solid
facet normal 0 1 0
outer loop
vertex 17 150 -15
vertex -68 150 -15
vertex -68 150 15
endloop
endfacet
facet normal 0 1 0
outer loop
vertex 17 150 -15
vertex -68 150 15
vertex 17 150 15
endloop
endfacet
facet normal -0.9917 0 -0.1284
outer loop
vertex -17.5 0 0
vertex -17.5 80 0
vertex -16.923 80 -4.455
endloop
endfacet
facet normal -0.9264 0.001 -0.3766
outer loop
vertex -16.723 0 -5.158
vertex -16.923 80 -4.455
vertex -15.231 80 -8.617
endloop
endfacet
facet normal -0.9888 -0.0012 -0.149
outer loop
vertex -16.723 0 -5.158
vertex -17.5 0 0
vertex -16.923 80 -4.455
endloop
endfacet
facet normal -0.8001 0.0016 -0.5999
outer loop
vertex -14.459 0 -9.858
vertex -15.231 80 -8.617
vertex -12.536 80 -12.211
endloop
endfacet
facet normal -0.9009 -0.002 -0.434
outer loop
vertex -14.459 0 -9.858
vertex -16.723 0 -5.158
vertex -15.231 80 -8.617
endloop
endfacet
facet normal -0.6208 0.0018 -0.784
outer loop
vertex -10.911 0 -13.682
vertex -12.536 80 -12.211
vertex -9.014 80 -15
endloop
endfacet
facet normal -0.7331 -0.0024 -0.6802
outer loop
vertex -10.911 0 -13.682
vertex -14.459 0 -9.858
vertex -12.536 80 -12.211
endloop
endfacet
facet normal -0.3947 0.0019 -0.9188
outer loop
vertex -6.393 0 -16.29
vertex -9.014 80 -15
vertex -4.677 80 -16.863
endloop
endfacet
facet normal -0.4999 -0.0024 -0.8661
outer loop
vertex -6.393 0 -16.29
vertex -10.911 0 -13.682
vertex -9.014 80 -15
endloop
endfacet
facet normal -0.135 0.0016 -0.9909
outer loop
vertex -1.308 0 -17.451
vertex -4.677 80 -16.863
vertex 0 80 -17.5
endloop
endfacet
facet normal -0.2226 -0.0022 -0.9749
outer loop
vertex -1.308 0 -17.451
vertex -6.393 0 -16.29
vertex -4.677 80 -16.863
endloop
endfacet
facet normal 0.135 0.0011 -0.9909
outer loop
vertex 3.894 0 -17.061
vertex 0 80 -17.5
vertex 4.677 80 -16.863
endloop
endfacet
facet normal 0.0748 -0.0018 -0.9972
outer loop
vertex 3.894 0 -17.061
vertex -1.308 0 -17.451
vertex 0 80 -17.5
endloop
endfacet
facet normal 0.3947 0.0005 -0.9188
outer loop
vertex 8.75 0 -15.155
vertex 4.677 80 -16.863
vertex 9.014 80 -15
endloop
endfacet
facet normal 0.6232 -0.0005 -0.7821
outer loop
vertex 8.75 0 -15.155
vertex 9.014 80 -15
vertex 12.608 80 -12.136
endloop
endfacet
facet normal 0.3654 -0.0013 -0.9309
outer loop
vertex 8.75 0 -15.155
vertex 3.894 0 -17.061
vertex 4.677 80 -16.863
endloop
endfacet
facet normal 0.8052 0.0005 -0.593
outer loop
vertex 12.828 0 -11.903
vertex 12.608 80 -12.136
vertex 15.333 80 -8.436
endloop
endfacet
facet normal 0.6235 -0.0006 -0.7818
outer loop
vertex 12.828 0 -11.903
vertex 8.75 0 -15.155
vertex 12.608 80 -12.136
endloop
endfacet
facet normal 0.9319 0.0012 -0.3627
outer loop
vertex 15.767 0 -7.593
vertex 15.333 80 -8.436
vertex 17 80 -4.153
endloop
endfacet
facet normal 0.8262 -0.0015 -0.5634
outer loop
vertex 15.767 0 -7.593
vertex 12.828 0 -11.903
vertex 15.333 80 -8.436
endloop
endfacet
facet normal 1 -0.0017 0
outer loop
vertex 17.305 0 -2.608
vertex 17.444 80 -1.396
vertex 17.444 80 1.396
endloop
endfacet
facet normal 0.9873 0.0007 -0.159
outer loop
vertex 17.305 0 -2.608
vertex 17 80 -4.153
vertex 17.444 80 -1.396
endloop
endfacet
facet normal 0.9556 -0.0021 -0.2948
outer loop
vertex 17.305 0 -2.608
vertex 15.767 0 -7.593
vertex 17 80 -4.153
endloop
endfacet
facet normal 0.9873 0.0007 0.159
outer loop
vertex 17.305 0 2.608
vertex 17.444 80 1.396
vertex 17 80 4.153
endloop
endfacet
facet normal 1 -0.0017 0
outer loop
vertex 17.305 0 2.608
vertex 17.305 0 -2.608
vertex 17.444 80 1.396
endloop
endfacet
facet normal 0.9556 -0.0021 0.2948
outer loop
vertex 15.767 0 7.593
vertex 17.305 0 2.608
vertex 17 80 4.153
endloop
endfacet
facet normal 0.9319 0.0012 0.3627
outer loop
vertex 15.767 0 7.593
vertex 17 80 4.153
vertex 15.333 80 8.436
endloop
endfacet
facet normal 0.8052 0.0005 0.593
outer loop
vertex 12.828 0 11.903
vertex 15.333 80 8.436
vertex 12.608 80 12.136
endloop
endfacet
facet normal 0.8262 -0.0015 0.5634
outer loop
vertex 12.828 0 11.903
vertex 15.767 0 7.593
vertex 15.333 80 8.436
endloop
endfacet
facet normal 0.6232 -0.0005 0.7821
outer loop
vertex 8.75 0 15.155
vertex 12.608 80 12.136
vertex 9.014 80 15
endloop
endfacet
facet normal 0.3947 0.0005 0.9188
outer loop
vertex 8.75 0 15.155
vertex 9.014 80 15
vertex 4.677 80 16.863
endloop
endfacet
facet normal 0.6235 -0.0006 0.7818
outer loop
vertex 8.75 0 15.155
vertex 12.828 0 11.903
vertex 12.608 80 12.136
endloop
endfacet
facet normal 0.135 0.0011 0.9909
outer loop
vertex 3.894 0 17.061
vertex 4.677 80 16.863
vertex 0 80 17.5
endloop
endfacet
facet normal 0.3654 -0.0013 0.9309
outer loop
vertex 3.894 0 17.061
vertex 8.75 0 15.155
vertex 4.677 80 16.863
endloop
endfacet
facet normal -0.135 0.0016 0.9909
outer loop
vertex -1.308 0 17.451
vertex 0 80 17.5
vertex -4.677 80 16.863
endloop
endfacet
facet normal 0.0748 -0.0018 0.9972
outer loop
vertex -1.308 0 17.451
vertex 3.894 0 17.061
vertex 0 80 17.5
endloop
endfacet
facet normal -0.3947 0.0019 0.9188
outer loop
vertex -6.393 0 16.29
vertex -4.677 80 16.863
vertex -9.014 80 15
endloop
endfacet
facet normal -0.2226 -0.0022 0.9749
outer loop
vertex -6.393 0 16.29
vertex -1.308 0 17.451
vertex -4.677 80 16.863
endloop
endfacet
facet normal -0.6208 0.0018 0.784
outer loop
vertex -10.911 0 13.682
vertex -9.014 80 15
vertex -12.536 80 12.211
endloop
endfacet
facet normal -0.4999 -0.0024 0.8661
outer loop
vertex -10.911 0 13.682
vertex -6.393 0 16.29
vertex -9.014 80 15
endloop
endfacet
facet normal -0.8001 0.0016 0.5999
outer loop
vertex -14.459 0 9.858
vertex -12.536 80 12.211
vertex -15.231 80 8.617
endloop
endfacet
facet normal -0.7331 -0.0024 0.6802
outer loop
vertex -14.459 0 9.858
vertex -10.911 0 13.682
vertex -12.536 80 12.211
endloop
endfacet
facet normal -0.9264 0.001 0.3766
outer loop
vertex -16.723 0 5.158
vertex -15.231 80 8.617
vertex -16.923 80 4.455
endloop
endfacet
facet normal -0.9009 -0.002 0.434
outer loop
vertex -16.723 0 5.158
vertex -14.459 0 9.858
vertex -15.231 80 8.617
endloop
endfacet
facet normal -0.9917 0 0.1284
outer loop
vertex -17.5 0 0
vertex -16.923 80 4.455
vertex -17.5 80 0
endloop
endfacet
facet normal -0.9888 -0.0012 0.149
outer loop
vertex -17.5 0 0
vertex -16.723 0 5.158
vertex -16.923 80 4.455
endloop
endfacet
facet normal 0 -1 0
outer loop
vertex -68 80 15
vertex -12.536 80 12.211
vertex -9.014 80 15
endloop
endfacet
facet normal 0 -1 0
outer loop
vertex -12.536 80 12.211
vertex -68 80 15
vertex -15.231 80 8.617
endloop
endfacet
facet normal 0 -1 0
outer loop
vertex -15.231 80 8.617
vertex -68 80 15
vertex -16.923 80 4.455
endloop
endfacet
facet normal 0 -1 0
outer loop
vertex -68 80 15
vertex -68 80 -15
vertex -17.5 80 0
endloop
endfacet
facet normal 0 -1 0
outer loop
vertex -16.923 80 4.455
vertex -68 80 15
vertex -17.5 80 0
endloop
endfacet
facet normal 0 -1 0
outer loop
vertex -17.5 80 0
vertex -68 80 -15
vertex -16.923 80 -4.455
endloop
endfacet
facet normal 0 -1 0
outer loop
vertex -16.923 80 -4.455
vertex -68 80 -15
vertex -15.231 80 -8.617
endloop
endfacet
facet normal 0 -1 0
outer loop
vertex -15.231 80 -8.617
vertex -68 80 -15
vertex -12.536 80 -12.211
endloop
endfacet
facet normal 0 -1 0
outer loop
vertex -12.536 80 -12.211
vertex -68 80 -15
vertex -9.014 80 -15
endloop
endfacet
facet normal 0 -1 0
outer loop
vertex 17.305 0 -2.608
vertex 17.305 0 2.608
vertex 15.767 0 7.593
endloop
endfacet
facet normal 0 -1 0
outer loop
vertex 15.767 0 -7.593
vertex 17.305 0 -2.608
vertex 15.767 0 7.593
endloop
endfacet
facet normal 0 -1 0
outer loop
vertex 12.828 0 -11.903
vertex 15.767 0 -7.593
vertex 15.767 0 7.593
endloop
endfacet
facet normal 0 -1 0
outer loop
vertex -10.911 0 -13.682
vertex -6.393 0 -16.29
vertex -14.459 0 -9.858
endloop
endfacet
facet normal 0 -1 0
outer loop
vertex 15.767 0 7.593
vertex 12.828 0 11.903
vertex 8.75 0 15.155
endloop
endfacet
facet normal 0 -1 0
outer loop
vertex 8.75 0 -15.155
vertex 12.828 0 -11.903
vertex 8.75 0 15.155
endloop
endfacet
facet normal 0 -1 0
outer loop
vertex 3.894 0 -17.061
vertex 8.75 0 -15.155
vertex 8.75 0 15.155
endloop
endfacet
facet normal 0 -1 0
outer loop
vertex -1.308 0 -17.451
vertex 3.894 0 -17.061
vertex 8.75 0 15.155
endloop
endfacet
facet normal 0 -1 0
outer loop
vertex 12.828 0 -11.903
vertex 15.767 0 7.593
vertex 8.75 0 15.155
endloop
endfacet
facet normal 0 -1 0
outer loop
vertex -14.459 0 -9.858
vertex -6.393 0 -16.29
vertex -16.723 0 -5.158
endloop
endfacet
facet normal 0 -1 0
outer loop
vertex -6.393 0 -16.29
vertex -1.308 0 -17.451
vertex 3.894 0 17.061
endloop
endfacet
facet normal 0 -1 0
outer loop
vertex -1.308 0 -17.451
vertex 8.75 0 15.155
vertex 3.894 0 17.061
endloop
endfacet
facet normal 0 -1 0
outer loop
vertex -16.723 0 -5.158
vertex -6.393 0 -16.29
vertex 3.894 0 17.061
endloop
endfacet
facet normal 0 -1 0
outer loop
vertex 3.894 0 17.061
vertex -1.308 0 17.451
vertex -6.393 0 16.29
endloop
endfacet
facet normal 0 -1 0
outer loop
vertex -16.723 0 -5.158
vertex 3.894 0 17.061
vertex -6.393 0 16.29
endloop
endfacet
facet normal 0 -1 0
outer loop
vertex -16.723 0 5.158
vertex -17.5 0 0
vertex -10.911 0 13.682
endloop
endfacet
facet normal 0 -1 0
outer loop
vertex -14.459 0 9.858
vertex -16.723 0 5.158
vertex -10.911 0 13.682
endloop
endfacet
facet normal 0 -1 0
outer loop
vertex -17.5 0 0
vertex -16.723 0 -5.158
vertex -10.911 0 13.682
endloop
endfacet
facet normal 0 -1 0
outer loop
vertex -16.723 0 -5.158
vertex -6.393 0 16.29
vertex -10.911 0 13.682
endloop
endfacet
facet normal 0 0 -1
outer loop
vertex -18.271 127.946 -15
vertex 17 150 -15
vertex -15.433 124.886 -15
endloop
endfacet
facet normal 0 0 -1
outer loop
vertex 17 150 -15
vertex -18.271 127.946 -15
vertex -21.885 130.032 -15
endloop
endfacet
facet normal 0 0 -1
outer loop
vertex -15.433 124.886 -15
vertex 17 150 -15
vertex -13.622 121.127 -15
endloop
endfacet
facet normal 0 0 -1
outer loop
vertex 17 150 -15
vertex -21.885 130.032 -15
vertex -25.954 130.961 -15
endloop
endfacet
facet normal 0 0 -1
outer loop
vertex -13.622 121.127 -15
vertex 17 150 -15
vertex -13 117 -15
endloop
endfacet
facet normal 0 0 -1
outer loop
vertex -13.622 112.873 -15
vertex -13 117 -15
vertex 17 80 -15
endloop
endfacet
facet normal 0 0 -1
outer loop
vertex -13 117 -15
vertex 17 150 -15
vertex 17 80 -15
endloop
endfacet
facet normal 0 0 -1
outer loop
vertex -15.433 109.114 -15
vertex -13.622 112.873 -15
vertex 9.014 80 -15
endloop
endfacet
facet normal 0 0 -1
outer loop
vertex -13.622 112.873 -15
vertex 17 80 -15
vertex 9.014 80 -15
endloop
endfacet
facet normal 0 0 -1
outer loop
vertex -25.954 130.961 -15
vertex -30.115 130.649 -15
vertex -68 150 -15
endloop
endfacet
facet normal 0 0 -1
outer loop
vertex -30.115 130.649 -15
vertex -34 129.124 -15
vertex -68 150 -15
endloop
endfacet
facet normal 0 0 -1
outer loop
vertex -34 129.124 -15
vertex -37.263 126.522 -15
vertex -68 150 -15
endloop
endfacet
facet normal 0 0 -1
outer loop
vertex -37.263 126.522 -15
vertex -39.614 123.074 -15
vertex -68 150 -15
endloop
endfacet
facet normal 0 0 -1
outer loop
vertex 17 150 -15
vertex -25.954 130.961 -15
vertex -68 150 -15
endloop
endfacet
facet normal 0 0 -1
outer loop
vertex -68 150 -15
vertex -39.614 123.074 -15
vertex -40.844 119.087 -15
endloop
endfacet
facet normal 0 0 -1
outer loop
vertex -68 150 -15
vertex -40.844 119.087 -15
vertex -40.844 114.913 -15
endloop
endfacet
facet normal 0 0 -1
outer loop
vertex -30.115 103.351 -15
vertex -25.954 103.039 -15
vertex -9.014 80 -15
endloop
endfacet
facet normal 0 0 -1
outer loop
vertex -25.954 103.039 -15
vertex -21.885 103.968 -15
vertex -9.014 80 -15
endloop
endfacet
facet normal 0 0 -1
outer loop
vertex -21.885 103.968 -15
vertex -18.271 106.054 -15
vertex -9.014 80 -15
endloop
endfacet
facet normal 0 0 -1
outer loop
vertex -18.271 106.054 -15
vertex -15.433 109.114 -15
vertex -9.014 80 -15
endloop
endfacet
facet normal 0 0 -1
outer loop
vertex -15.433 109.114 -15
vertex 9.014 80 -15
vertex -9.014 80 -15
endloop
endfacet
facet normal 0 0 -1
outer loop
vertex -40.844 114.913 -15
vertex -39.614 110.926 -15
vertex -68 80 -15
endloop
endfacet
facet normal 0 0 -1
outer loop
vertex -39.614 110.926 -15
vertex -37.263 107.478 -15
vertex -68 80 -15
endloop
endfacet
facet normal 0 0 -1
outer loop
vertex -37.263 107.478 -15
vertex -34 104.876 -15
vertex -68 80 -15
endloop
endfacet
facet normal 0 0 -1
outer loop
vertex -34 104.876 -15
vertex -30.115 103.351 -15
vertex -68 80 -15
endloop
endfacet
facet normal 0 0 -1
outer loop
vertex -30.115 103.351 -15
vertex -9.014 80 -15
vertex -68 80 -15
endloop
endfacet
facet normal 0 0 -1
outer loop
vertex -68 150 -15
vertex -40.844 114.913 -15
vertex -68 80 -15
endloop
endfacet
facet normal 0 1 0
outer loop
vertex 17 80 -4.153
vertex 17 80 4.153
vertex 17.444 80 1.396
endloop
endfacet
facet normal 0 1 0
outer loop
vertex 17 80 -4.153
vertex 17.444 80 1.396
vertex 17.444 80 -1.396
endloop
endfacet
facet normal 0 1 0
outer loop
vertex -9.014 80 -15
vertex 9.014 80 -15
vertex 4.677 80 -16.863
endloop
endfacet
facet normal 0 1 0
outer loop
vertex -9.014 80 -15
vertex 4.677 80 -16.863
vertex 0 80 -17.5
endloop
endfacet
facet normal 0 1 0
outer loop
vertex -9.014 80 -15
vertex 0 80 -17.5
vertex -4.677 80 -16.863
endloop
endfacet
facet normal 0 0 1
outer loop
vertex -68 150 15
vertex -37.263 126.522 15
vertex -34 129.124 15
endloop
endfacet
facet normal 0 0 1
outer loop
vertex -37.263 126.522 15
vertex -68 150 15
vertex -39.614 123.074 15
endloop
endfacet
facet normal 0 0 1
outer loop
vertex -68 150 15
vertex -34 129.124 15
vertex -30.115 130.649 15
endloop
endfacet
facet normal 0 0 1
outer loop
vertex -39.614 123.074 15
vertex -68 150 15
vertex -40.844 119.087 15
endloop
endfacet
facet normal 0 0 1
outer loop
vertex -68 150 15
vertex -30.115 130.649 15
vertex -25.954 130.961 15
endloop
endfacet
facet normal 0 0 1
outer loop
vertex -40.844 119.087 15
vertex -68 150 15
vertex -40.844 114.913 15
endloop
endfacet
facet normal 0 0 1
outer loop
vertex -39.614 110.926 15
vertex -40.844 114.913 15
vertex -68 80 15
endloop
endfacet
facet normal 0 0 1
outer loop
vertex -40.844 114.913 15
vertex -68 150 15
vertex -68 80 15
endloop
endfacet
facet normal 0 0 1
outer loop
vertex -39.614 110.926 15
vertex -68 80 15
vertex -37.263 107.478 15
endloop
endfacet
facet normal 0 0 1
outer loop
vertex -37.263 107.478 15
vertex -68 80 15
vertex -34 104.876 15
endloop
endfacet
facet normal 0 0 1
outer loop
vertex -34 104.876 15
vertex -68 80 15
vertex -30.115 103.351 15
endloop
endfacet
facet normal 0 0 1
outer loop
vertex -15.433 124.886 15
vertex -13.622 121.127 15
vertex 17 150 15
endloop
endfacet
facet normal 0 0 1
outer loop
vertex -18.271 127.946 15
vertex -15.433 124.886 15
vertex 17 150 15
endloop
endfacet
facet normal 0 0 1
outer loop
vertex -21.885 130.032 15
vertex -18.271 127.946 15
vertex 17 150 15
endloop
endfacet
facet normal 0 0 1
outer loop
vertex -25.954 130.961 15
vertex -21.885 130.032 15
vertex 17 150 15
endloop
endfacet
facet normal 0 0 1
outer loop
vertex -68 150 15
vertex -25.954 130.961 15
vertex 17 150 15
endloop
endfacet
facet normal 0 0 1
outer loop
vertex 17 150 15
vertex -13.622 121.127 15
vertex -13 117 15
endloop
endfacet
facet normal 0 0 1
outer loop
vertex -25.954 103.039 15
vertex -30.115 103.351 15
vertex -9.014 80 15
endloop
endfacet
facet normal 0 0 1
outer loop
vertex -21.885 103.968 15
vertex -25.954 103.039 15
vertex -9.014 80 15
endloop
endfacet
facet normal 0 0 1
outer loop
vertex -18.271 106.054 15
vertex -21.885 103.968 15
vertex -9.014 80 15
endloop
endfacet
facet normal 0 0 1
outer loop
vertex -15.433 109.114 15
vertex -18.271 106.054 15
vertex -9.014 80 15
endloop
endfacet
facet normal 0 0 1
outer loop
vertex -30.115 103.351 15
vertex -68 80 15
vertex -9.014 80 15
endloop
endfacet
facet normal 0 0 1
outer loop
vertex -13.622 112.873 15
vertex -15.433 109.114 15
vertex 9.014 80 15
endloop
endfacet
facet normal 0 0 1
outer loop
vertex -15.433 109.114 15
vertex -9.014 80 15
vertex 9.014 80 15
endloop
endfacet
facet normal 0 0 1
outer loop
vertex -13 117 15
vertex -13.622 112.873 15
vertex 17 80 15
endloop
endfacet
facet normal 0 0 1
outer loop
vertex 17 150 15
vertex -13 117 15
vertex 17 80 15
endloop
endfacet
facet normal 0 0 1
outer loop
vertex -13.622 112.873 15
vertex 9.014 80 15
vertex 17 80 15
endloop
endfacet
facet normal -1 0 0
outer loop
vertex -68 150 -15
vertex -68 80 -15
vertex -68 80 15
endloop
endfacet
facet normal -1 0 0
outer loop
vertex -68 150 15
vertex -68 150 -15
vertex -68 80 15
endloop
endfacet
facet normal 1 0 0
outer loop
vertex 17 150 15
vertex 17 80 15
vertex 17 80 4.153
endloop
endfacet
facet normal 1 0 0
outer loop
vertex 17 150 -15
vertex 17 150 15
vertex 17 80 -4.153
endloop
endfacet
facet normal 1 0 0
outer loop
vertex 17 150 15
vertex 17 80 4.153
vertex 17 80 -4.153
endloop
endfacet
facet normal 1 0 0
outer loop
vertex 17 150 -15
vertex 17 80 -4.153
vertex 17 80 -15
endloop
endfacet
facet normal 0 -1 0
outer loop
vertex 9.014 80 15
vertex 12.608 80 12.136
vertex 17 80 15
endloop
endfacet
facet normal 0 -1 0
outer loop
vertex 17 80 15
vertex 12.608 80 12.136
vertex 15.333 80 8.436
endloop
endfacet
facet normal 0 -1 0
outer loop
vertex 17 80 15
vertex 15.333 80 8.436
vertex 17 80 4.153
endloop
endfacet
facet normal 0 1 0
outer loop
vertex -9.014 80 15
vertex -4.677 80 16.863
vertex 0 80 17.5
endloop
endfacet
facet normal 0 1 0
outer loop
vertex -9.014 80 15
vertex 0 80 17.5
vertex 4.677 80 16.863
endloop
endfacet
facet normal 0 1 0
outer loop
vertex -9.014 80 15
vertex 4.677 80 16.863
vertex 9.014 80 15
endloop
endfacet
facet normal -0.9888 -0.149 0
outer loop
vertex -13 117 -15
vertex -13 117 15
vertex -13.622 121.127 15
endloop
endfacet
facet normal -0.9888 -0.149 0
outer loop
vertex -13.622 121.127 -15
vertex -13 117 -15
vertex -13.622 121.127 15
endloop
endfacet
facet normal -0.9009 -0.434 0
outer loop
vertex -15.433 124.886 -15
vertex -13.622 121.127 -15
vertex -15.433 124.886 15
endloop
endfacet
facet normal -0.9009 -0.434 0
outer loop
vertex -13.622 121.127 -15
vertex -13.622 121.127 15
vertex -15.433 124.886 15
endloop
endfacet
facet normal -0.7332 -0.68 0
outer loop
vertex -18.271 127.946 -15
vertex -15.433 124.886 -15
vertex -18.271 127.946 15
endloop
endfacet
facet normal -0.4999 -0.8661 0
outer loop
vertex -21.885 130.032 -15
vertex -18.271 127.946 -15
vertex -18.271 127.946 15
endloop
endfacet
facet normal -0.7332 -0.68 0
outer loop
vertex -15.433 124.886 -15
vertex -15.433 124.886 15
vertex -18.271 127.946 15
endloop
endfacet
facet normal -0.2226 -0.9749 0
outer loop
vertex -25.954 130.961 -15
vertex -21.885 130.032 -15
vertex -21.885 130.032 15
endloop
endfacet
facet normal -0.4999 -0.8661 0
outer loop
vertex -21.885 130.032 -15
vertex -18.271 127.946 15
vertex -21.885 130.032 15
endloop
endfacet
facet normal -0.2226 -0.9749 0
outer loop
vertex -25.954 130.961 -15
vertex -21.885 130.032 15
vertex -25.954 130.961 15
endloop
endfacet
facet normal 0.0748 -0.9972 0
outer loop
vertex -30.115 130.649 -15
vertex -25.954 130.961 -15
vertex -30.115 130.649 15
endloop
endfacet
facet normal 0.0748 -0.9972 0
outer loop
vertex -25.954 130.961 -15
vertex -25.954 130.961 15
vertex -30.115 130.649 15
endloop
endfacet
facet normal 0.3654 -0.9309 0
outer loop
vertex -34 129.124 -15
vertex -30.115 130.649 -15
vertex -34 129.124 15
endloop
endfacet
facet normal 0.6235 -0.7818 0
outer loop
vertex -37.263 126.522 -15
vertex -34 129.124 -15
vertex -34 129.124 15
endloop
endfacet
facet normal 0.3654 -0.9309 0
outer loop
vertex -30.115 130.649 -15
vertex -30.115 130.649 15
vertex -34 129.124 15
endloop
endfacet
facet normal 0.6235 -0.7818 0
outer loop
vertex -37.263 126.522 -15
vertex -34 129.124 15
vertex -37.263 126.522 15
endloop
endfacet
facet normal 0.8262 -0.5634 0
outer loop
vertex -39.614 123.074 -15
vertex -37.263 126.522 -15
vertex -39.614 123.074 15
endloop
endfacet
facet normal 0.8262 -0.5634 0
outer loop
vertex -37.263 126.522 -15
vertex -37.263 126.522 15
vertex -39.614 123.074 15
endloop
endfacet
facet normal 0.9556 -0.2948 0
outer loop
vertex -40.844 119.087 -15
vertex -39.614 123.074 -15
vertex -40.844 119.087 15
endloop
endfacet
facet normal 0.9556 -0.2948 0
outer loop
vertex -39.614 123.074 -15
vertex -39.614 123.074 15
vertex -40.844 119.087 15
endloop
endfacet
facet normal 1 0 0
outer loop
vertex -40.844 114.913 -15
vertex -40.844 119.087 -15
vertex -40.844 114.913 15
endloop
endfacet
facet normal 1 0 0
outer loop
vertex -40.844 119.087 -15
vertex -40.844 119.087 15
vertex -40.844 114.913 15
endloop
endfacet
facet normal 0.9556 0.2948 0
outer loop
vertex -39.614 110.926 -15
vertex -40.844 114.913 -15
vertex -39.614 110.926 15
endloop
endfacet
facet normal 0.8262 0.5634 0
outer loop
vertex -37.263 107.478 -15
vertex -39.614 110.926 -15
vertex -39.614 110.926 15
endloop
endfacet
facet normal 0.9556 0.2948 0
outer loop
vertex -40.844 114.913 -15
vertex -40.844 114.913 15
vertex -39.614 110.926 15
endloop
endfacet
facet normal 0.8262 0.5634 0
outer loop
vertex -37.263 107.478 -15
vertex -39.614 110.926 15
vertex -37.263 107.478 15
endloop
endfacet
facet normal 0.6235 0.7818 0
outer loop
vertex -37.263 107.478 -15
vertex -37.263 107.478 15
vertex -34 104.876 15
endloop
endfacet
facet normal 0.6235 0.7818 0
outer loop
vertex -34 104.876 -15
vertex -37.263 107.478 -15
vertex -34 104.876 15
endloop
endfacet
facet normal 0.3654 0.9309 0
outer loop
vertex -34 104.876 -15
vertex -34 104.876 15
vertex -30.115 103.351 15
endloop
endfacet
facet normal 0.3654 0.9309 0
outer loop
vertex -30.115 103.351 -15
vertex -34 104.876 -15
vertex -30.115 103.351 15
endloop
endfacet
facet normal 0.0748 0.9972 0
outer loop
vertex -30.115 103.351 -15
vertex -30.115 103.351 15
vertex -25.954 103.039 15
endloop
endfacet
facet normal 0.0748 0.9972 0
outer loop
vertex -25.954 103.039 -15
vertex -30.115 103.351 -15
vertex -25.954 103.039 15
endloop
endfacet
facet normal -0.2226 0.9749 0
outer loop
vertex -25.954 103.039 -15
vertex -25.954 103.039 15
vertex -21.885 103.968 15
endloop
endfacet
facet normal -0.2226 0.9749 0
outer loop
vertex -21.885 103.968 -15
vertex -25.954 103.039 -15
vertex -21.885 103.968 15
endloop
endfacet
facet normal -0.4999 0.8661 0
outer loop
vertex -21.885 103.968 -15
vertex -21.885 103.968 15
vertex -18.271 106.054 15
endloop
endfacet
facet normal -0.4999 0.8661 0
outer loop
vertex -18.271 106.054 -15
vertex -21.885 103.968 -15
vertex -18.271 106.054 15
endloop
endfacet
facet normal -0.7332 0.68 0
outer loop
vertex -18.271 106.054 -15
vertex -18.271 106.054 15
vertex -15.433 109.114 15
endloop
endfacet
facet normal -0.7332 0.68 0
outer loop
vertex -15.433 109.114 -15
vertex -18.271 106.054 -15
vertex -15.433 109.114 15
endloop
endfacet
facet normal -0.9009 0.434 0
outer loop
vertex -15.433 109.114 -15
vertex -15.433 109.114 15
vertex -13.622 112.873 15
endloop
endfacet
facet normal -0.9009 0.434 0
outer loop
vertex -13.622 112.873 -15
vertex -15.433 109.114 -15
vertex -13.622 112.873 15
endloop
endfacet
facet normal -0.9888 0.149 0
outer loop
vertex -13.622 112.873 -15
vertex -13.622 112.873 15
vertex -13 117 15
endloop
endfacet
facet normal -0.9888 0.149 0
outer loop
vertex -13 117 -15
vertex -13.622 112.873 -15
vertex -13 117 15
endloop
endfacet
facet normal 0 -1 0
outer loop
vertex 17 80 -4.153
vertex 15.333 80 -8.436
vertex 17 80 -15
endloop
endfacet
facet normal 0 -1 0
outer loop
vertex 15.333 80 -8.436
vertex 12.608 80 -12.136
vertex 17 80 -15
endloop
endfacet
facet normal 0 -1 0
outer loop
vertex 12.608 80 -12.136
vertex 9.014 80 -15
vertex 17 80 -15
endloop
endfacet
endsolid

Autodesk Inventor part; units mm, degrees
ref_plane "YZ Plane" through (0, 0, 0) normal (1, 0, 0) x (0, 1, 0)
ref_plane "XZ Plane" through (0, 0, 0) normal (0, 1, 0) x (-1, 0, 0)
ref_plane "XY Plane" through (0, 0, 0) normal (0, 0, 1) x (1, 0, 0)
sketch "Sketch1" plane through (0, 0, 0) normal (0, 1, 0) x (-1, 0, 0)
  circle A0 centre (0, 0) radius 17.5
  dimension "d0" = 35
extrude "Extrusion1" add sketch "Sketch1" along normal blind 80
sketch "Sketch2" plane through (0, 80, 0) normal (0, 1, 0) x (1, 0, 0)
  line L0 (-68, -15) -> (17, -15)
  line L1 (17, -15) -> (17, 15)
  line L2 (17, 15) -> (-68, 15)
  line L3 (-68, 15) -> (-68, -15)
  point P0 (0, 0)
  dimension "d3" = 85
  dimension "d4" = 30
extrude "Extrusion2" add sketch "Sketch2" along normal blind 70
sketch "Sketch3" plane through (-68, 80, 15) normal (0, 0, 1) x (1, 0, 0)
  circle A0 centre (41, 37) radius 14
  point P0 (68, -80)
extrude "Extrusion3" cut sketch "Sketch3" against normal through all
properties part number "motor hombro"
